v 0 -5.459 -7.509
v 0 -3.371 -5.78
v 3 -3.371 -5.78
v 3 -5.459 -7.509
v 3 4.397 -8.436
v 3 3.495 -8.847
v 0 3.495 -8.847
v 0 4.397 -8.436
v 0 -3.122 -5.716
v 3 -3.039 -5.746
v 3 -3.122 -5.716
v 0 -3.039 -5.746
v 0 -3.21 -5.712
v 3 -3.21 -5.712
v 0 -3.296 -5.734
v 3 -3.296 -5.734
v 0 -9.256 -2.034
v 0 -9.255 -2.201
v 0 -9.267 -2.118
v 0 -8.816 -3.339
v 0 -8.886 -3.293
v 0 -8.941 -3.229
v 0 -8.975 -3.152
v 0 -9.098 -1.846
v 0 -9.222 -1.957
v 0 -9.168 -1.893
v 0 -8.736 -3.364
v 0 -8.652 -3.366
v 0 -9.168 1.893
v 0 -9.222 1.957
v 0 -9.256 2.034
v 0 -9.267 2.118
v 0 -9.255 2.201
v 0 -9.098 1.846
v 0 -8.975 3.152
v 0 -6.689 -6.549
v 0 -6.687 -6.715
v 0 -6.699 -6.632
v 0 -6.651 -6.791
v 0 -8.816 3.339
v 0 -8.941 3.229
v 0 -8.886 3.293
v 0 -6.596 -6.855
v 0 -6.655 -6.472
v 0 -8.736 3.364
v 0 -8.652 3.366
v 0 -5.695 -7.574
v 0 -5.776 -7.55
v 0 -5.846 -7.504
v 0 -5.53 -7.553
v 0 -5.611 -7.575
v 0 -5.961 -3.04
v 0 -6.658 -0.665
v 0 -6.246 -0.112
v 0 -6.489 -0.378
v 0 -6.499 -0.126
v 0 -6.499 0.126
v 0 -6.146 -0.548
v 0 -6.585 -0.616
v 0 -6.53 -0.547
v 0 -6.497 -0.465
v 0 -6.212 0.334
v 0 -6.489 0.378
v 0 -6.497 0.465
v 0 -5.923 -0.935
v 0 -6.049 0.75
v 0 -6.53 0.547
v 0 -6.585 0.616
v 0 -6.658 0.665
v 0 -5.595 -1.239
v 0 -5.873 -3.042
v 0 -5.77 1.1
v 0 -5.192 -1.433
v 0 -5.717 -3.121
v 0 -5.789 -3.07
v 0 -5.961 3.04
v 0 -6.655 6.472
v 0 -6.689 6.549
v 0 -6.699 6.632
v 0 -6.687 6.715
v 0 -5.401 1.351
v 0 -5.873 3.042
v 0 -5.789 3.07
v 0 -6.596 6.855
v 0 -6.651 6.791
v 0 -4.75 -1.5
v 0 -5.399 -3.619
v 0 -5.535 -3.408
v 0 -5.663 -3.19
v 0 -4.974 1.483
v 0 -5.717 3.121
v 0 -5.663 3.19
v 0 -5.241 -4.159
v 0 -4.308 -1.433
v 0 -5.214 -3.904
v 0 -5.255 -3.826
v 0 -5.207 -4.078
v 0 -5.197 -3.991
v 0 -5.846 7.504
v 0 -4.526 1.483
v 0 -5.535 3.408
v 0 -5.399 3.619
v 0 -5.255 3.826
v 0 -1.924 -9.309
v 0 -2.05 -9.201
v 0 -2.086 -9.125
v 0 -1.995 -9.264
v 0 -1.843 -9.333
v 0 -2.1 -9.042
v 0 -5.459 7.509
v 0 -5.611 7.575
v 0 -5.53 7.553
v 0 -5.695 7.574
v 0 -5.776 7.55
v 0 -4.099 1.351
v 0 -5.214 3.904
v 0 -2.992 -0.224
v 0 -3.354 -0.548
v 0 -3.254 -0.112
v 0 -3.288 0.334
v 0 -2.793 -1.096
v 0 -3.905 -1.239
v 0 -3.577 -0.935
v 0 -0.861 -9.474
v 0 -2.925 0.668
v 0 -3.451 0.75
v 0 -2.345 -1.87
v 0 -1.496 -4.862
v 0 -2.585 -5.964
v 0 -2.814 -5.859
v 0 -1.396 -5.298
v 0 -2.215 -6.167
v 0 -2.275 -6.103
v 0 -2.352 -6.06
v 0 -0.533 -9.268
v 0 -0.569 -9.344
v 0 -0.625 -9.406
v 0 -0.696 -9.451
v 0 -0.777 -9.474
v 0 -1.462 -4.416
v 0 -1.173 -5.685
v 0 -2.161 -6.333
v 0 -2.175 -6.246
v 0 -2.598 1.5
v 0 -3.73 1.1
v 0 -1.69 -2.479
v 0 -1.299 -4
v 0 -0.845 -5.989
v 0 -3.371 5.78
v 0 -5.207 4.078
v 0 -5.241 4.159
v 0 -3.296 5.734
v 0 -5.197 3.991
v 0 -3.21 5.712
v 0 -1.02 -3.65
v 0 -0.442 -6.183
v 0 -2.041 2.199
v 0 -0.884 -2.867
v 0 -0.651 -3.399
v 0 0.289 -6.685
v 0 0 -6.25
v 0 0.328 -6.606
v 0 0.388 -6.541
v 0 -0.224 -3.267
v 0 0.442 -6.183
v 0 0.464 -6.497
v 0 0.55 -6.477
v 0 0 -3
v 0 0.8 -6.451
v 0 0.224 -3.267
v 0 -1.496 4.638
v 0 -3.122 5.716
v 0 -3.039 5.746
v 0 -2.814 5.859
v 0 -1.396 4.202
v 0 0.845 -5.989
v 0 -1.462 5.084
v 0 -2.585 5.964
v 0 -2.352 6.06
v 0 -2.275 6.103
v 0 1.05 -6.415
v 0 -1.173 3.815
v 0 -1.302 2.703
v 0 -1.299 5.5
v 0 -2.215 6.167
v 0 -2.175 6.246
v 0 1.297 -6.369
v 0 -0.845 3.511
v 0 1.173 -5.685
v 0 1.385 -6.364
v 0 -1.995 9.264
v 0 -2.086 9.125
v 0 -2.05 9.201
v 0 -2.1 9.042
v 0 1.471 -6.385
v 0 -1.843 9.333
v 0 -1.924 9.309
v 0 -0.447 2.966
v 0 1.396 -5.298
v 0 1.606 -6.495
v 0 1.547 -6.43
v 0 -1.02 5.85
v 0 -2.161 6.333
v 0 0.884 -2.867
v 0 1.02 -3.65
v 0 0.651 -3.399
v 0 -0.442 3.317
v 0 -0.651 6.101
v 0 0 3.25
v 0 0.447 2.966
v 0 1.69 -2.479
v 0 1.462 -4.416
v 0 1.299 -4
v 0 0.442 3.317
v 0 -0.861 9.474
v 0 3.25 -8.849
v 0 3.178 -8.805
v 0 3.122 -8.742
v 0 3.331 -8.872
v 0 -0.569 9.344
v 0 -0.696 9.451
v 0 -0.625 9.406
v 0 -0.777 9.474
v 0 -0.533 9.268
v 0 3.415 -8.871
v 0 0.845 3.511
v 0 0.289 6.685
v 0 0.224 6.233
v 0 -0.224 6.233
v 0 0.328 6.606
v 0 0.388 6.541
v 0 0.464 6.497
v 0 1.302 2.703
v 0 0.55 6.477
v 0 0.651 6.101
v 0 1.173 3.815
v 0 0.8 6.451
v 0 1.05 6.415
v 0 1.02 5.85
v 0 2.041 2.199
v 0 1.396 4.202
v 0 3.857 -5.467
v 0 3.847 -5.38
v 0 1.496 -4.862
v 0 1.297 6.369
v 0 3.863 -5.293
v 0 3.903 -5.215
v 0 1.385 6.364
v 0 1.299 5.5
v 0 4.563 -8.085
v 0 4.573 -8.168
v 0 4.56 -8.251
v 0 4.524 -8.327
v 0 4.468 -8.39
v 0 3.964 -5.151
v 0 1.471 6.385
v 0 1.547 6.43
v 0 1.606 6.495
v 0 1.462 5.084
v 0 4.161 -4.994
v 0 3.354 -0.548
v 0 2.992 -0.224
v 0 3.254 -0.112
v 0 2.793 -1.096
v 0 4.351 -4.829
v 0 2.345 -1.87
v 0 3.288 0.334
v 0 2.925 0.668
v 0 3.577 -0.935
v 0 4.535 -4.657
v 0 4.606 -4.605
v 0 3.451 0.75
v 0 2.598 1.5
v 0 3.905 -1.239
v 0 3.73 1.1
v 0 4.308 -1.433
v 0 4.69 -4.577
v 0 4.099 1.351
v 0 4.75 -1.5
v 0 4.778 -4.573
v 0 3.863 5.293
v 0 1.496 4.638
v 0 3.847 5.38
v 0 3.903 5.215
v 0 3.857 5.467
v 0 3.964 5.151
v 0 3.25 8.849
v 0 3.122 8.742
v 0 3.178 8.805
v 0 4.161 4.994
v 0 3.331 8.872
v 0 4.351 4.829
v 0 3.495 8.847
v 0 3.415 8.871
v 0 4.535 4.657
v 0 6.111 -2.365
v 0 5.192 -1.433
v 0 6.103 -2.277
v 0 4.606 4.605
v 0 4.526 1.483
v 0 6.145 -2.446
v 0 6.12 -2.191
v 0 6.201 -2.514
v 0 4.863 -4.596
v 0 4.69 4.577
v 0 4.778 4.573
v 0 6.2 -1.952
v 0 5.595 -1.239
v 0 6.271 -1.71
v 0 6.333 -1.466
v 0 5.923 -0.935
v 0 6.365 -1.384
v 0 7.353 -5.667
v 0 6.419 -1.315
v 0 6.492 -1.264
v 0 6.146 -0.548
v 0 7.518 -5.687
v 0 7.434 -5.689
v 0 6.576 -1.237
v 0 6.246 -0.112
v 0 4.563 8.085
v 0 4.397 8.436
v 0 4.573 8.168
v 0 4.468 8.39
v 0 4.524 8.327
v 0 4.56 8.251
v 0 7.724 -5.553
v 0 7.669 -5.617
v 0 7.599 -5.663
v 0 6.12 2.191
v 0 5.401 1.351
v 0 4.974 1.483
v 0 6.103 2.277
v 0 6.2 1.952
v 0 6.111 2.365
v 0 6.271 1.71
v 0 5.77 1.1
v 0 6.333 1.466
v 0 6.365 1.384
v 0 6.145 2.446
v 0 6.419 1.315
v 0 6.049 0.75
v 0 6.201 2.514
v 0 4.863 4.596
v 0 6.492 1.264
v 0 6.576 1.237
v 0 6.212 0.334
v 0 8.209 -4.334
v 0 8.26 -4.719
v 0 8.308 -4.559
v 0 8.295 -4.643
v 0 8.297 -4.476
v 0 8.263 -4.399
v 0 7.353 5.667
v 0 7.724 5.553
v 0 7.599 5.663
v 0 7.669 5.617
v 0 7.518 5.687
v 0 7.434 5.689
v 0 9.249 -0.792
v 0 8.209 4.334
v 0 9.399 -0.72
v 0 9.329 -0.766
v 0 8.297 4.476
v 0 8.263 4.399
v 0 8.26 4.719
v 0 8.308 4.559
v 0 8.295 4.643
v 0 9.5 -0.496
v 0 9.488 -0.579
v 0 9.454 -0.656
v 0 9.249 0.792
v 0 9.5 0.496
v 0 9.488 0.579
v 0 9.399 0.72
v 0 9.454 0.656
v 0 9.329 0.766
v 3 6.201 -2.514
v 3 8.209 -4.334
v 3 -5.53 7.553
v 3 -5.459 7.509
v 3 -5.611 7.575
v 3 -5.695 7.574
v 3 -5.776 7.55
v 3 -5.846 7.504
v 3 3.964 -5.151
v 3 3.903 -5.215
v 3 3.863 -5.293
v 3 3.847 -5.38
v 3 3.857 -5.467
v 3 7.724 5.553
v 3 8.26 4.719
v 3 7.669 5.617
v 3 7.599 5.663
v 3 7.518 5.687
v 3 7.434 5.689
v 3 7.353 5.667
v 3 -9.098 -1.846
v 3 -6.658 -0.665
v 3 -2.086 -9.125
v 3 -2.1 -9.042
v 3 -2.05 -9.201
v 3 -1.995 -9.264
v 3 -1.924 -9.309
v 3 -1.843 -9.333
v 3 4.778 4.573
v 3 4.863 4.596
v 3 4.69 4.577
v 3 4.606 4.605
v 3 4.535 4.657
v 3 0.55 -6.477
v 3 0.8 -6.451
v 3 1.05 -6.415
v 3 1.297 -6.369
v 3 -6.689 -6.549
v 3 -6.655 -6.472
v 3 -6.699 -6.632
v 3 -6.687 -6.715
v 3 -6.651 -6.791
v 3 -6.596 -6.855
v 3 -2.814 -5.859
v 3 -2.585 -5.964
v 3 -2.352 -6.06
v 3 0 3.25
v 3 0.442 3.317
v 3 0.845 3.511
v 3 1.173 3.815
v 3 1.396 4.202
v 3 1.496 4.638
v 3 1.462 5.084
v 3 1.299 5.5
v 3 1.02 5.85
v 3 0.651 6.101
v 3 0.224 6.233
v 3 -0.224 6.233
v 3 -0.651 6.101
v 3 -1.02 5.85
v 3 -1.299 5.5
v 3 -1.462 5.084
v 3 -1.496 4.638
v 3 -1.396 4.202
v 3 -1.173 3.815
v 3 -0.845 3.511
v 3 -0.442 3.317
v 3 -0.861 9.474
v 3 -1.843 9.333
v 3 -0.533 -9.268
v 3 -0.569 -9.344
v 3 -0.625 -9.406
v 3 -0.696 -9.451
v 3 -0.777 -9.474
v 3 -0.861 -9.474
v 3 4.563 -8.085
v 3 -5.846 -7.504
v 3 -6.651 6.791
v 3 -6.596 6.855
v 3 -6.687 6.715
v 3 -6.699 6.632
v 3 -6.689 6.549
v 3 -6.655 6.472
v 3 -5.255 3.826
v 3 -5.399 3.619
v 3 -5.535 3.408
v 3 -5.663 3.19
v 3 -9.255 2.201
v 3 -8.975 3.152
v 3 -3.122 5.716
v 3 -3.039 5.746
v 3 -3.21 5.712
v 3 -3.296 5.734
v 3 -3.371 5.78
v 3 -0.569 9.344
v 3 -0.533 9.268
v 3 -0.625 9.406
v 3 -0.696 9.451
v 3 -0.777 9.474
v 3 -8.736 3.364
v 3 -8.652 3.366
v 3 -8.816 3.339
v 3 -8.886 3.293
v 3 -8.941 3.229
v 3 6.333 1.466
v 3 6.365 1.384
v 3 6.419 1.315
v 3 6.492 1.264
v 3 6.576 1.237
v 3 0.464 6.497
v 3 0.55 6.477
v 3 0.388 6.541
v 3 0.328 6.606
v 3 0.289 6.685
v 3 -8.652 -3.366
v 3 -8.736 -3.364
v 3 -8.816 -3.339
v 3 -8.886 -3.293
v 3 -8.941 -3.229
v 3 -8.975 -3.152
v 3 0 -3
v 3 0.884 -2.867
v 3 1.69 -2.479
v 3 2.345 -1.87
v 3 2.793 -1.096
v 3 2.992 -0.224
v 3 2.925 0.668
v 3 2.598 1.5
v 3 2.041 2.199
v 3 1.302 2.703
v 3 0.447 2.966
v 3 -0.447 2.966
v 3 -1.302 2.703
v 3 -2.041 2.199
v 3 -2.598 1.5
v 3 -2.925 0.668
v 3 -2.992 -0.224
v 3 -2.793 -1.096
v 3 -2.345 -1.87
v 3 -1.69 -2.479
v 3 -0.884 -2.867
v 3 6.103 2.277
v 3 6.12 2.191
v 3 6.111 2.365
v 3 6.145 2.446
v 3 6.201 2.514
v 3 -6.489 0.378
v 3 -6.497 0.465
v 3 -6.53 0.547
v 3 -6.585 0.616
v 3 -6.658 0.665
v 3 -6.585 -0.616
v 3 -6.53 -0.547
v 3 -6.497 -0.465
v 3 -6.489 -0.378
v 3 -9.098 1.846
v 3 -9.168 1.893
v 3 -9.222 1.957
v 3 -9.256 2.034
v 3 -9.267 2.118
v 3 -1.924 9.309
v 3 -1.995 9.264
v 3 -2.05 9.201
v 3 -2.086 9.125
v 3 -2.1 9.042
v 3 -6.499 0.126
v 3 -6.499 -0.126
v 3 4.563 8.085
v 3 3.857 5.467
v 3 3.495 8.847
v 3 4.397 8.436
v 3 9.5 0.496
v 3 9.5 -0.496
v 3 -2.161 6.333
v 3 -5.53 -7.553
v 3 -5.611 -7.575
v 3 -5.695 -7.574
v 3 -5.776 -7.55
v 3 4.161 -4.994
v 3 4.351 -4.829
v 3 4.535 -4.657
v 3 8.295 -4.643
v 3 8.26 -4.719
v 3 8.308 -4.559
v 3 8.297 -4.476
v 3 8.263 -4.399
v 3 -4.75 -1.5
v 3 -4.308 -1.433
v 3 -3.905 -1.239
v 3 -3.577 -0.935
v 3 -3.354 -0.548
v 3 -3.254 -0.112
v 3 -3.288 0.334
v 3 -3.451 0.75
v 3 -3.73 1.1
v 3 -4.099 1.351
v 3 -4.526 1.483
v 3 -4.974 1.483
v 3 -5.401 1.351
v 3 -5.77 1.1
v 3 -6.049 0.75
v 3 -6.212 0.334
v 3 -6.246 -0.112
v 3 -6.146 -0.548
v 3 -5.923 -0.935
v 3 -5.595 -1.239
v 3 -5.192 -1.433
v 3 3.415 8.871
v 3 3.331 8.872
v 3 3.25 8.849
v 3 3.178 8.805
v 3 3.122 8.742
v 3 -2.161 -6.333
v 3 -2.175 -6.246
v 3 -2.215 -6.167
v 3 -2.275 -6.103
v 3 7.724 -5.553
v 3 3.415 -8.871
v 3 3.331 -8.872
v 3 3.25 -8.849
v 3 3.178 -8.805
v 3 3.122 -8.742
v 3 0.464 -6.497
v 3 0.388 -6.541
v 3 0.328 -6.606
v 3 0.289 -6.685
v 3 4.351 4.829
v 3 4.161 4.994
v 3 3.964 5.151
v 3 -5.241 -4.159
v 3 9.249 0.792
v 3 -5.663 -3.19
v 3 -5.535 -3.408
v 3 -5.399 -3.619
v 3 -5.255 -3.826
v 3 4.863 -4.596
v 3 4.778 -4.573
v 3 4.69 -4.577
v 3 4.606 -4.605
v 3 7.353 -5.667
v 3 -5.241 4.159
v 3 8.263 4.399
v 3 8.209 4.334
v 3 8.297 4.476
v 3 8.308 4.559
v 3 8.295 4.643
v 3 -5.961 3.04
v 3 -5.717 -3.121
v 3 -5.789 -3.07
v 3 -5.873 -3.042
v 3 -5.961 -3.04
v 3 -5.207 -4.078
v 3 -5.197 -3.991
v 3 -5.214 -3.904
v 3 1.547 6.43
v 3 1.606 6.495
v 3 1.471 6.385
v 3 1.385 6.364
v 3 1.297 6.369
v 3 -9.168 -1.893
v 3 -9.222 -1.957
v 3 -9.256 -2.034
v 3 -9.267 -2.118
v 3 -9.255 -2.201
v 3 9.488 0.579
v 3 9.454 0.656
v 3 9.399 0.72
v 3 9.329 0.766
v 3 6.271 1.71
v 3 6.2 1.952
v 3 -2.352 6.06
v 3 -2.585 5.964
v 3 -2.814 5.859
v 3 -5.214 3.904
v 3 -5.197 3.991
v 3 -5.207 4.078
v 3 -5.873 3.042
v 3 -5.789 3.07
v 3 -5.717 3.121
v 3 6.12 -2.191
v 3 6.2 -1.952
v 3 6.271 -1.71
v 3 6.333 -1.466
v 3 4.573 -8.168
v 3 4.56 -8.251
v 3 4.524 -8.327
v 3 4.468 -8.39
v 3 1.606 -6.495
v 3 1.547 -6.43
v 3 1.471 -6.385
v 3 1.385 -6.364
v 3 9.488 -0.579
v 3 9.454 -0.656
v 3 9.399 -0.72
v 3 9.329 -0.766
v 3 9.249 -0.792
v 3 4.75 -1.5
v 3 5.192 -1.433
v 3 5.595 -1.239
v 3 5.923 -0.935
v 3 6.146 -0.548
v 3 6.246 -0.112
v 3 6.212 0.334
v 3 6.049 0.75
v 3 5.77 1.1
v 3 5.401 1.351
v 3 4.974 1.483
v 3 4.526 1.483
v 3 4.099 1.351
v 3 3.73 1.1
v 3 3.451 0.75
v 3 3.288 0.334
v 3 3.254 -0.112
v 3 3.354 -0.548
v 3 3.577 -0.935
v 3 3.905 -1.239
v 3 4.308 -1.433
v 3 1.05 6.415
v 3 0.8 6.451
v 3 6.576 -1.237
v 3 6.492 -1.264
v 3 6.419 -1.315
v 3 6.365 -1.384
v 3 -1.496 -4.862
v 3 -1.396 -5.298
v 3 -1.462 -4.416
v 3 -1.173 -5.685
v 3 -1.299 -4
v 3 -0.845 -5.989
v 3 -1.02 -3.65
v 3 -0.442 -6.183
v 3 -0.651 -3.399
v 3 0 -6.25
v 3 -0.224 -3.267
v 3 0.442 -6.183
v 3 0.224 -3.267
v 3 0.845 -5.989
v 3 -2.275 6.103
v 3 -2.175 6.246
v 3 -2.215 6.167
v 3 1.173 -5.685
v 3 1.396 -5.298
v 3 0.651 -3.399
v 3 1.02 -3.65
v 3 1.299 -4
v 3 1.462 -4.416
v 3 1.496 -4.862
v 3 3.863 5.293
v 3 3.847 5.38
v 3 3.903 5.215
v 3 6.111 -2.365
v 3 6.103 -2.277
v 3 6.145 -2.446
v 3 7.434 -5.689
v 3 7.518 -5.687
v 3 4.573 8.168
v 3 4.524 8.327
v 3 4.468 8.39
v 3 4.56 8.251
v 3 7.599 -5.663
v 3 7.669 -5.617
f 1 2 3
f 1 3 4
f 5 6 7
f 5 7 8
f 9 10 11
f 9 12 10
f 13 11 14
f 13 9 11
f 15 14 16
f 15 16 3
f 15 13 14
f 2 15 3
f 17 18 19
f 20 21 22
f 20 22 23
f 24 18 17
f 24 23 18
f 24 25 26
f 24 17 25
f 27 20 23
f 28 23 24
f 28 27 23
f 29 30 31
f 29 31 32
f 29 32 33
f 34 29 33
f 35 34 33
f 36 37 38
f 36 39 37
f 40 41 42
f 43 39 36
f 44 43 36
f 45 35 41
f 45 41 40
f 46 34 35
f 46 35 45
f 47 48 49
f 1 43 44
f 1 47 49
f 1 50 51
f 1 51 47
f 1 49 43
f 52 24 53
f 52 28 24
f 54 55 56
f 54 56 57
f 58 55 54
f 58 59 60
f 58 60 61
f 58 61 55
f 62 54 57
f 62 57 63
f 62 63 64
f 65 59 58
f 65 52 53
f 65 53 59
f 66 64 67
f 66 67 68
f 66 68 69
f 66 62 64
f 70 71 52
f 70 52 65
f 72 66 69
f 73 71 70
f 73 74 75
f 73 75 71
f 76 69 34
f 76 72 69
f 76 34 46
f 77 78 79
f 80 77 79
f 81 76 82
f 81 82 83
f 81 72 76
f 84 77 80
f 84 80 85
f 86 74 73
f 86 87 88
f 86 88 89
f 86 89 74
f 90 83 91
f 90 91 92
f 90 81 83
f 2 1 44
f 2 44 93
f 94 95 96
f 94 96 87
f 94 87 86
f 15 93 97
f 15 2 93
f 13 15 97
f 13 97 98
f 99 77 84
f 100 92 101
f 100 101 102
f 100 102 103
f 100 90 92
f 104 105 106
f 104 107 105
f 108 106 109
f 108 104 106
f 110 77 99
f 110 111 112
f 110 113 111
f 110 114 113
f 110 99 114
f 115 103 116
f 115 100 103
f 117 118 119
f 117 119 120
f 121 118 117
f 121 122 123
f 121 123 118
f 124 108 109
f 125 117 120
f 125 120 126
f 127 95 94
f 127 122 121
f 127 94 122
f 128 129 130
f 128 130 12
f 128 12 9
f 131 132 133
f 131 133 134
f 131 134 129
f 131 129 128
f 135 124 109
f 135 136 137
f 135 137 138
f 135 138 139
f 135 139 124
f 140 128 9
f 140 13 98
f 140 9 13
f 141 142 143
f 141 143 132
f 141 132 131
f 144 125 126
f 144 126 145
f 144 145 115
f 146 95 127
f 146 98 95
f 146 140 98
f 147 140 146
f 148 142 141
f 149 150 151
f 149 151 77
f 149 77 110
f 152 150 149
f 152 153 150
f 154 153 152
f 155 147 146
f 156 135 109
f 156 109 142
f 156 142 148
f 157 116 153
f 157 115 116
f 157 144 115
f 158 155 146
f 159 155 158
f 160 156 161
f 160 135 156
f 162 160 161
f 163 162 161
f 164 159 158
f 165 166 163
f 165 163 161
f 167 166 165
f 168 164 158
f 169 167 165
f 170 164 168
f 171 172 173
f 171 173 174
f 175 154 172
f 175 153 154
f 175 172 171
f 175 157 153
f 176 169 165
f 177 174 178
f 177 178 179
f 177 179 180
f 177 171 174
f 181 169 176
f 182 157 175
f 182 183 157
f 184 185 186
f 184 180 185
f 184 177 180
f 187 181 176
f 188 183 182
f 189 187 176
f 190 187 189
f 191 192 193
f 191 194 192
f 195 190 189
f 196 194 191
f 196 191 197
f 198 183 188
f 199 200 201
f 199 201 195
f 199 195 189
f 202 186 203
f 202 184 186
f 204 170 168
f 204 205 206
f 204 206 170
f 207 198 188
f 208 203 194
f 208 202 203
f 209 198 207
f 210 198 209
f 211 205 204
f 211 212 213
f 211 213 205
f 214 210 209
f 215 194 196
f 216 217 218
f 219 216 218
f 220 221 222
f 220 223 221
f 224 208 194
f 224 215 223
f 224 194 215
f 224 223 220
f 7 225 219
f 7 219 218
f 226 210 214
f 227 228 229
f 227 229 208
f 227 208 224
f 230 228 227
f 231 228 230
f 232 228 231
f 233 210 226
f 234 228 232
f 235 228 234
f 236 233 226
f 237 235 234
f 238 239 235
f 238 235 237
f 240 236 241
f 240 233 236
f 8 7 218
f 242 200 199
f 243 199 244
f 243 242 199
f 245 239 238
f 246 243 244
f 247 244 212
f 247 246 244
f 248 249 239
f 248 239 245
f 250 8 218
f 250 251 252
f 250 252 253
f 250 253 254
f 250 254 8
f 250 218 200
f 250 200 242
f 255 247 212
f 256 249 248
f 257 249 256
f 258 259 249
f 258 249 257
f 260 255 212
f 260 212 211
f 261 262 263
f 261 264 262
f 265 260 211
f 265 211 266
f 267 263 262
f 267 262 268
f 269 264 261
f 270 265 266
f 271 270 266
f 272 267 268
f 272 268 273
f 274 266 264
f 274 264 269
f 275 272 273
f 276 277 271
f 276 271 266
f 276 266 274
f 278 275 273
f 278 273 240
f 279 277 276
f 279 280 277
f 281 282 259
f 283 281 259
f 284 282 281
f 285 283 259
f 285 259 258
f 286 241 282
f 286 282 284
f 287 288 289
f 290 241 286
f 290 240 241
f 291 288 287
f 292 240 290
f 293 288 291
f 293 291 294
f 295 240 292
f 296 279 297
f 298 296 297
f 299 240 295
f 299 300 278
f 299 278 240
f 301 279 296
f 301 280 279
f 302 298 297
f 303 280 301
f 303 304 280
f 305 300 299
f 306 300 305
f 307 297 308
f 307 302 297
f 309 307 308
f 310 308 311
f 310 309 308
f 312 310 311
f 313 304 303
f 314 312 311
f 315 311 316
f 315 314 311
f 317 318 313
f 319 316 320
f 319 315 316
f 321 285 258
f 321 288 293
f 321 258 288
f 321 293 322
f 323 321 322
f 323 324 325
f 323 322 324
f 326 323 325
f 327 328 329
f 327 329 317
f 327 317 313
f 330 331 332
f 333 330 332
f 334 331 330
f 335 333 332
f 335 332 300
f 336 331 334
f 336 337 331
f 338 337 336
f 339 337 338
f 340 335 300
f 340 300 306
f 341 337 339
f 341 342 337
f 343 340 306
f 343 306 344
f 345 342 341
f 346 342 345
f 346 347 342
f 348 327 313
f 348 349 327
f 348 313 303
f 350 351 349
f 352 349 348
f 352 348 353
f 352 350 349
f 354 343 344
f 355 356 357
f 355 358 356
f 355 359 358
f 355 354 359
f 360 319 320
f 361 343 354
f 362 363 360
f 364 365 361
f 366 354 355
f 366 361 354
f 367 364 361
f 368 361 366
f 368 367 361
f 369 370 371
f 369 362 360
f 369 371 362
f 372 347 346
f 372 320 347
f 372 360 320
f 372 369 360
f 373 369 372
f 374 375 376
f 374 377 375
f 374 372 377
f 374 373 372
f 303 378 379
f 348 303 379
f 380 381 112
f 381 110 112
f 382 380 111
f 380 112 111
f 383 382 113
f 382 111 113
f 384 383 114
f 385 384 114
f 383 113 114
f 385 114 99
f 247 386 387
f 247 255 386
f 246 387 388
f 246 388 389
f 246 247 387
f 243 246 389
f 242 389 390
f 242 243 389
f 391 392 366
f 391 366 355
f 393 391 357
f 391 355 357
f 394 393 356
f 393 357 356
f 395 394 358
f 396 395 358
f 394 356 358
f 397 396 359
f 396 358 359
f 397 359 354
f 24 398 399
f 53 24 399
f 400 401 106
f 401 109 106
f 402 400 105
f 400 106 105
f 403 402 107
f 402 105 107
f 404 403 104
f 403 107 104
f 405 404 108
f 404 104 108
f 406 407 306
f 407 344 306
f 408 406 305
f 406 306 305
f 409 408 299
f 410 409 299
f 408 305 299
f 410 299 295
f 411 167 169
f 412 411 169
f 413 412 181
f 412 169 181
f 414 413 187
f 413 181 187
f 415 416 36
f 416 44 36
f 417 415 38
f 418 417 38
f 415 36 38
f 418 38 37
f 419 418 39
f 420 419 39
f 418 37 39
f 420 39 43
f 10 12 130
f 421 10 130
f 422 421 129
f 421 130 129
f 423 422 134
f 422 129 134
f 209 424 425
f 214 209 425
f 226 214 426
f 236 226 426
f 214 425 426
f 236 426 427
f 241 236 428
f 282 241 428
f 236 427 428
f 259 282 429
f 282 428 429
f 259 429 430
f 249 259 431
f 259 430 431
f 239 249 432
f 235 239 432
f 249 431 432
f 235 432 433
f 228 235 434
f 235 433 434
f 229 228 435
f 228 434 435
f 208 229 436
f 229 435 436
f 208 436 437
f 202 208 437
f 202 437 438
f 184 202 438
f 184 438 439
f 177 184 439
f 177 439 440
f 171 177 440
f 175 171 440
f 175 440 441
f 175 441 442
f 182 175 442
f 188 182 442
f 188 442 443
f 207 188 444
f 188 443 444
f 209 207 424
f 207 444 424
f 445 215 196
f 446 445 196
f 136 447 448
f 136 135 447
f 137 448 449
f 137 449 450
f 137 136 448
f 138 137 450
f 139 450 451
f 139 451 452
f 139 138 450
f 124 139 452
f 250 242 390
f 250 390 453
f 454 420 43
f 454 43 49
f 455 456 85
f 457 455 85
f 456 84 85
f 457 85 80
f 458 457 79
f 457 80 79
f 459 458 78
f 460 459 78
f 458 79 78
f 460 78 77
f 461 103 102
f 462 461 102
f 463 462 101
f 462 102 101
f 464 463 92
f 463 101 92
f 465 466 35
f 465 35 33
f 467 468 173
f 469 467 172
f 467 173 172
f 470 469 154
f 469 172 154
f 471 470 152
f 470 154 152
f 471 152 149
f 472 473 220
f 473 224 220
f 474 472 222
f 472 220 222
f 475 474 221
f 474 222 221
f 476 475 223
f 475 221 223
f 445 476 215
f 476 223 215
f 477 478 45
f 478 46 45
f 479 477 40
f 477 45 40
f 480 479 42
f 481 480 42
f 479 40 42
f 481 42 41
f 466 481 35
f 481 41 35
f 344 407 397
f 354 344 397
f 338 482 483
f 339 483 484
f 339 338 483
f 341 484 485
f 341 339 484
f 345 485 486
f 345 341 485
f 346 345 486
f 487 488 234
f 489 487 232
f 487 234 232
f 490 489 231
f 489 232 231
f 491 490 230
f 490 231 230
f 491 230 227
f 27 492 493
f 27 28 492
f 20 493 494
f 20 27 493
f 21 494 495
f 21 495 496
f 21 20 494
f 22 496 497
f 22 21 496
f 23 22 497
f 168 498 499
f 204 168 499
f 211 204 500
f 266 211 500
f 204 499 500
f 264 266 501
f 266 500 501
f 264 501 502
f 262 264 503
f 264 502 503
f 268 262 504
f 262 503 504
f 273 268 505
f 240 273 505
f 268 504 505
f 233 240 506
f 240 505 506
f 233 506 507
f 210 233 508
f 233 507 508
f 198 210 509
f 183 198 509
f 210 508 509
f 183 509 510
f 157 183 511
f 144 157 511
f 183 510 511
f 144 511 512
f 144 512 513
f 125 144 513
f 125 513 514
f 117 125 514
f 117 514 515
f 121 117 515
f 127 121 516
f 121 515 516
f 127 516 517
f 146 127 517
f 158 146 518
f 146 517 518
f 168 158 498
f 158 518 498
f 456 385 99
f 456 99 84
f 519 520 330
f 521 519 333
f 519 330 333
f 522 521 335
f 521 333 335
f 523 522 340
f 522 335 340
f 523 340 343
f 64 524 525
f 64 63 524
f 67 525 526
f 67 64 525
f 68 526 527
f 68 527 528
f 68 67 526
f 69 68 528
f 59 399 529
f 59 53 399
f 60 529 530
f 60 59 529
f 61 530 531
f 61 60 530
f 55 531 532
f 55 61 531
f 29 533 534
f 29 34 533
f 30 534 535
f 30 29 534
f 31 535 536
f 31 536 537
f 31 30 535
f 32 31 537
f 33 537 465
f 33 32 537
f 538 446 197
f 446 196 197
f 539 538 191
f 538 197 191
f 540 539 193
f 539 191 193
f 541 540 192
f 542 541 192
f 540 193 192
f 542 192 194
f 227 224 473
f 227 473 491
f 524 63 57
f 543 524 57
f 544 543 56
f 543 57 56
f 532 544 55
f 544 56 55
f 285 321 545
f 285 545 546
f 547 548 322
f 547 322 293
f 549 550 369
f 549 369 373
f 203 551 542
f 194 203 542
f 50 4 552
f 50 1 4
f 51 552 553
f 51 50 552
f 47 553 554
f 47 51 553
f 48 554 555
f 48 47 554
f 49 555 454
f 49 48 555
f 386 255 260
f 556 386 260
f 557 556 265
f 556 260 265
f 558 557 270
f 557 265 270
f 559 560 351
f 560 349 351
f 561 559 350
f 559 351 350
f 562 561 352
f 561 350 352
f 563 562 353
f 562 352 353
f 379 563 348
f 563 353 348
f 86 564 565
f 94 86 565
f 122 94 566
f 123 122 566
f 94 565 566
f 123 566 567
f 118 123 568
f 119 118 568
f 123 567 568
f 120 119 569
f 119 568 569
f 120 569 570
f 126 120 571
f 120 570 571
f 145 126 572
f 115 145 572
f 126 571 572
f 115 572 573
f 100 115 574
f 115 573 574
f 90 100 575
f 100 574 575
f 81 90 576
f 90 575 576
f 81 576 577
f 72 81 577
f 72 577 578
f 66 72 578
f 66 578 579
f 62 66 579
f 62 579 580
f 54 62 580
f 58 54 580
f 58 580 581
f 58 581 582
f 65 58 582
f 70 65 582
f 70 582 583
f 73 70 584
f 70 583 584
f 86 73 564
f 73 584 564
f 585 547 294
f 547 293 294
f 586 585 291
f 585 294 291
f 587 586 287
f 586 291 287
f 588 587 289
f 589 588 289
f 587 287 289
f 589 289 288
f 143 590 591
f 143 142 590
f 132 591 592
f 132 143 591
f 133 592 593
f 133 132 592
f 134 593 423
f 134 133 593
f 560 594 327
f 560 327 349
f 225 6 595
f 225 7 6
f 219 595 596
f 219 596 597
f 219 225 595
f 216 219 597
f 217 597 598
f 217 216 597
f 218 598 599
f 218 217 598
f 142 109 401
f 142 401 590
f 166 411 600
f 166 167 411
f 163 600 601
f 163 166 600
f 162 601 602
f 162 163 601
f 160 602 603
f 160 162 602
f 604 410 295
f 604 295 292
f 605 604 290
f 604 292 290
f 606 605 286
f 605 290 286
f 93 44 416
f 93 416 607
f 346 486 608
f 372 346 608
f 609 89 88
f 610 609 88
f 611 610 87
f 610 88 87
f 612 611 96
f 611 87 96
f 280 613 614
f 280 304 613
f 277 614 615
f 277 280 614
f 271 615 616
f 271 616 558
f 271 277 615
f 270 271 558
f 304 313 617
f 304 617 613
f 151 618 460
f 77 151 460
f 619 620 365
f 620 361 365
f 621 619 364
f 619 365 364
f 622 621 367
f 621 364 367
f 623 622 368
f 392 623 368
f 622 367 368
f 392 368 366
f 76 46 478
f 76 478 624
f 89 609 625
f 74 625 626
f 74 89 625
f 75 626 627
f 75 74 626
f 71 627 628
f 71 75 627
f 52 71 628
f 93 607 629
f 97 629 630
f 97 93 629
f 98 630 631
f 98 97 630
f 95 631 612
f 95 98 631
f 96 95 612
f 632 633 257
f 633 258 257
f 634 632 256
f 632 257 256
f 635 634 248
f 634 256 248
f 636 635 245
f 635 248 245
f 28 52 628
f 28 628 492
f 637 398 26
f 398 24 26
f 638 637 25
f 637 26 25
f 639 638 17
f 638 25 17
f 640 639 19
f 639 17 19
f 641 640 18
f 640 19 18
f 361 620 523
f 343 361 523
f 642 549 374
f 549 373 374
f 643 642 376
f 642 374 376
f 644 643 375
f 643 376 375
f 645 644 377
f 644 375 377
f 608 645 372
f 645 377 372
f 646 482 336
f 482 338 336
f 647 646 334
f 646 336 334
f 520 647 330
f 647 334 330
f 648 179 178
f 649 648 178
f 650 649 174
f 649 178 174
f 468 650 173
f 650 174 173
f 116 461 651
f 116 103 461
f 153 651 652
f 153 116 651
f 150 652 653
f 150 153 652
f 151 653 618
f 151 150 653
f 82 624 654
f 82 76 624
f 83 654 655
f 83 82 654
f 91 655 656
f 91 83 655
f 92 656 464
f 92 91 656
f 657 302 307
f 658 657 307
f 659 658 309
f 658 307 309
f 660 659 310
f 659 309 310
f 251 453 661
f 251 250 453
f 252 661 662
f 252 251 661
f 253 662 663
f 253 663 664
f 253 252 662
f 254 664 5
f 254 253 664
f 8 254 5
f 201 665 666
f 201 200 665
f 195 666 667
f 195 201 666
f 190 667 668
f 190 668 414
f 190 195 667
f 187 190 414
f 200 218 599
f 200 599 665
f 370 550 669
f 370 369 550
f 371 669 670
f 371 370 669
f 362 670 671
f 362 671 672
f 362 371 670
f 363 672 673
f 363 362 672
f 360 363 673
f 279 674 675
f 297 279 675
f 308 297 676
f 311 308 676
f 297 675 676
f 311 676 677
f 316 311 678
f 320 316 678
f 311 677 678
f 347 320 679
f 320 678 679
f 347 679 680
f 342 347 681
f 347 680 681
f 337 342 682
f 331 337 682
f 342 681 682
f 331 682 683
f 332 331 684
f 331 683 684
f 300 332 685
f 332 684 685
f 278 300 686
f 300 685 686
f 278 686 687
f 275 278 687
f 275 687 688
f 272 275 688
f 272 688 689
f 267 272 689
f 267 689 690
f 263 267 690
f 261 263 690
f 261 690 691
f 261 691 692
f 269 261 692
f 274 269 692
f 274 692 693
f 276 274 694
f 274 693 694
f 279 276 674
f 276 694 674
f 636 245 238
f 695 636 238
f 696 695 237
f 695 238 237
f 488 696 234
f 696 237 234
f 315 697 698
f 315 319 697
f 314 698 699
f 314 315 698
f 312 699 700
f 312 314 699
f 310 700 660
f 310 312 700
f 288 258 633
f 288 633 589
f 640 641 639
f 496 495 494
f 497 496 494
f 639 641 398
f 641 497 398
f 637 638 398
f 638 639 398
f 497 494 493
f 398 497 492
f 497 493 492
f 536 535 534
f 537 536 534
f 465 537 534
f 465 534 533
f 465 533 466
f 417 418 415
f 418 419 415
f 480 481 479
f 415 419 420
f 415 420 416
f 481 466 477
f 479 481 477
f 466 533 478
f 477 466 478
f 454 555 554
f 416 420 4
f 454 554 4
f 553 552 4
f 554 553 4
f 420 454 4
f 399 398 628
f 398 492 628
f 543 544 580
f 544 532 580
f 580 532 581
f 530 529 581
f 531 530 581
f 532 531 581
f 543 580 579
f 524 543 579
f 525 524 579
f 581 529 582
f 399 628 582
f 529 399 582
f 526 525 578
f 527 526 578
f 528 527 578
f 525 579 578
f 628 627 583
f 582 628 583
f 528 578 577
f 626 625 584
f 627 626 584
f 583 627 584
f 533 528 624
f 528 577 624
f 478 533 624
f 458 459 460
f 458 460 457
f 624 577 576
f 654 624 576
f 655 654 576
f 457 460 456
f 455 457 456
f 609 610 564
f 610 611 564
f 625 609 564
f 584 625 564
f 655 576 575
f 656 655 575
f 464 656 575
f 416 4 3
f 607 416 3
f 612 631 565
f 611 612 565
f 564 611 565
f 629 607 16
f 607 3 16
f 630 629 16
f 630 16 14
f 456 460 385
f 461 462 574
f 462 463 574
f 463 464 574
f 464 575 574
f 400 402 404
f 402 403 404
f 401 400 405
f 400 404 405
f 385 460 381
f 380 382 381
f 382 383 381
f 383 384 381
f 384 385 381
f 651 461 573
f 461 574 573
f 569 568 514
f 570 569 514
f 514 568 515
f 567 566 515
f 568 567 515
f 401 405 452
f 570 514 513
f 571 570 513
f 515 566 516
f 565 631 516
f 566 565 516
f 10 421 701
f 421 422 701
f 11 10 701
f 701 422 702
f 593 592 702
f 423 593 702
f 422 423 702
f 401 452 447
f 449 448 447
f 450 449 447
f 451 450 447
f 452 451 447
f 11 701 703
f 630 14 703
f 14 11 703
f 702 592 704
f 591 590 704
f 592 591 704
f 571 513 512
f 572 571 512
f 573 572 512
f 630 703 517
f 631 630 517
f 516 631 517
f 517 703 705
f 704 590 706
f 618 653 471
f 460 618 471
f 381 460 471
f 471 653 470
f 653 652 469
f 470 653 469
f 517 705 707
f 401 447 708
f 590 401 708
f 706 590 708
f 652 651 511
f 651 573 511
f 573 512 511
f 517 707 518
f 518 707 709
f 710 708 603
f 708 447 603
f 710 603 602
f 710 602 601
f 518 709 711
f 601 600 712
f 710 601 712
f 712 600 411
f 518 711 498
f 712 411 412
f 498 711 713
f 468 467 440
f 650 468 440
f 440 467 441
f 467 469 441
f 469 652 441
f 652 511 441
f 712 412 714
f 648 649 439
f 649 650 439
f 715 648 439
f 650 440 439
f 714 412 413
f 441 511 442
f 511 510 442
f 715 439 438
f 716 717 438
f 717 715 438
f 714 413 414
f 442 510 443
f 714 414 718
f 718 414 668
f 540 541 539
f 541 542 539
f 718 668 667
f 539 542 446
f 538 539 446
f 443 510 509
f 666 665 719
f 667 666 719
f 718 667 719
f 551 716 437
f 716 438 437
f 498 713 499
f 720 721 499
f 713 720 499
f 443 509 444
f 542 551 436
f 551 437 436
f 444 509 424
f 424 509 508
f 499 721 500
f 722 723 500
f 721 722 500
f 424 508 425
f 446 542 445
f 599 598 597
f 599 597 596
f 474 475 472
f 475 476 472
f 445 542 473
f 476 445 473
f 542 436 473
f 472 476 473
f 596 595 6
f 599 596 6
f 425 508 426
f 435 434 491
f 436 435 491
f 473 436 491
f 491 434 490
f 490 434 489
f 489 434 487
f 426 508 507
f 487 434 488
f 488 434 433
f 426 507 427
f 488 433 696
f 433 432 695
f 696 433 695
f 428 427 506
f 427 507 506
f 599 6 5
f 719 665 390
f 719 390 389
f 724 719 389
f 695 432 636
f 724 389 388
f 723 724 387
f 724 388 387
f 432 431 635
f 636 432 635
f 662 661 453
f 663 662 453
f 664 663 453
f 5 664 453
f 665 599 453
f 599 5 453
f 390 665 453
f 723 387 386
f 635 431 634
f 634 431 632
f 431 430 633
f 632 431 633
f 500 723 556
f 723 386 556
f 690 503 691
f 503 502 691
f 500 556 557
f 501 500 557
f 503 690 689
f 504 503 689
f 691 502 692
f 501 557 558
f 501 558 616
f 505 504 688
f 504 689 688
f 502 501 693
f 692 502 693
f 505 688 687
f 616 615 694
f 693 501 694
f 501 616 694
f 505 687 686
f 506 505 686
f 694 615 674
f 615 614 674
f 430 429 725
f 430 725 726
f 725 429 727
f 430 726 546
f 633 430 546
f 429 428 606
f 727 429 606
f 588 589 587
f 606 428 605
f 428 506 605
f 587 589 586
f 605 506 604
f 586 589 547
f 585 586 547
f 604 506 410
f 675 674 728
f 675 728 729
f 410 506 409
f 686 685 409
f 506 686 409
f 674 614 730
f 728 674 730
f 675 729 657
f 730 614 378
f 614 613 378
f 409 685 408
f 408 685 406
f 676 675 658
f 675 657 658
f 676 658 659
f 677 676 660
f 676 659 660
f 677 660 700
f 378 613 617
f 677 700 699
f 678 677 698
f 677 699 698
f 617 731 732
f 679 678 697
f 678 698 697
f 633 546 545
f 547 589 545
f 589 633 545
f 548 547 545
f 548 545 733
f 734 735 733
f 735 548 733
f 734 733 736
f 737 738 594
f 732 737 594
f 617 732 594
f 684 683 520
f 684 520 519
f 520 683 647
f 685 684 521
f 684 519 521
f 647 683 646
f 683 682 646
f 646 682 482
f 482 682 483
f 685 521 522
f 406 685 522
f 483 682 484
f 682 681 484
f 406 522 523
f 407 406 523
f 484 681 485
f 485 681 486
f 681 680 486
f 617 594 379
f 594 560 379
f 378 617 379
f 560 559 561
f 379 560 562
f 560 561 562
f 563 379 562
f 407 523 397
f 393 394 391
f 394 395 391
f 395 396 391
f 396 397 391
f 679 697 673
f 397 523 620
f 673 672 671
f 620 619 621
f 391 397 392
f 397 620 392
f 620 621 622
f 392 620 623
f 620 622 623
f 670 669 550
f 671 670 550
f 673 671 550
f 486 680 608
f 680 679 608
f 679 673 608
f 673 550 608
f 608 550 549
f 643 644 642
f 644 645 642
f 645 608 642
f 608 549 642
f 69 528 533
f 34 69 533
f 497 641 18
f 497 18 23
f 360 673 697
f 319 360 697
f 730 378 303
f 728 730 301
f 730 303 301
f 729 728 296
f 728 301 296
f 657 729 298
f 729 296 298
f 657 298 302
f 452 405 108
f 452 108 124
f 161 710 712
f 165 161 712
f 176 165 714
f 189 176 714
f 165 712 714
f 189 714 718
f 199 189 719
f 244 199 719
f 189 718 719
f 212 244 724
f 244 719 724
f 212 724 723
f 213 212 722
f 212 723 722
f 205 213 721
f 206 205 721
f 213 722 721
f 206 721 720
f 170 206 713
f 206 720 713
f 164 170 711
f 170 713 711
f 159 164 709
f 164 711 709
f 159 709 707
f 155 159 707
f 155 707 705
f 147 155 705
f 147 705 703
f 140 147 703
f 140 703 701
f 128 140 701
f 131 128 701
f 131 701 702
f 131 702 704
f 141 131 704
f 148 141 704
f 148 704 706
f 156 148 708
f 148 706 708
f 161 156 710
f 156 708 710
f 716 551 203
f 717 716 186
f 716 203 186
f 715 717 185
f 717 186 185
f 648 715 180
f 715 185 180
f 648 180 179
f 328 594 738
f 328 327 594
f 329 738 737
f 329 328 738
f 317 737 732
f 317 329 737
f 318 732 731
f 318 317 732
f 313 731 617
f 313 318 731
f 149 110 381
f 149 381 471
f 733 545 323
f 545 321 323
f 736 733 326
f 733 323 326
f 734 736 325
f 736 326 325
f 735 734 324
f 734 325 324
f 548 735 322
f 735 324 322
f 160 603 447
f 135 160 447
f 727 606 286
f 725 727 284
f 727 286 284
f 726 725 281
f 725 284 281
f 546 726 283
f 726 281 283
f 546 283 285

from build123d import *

# Parameters (mm, degrees)
SKETCH9_R                 = 6.5
BOSS_EXTRUDE3_DEPTH       = 3
BOSS_EXTRUDE4_DEPTH       = 3
FILLET9_R                 = 0.3
FILLET10_R                = 0.3
FILLET11_R                = 0.3
FILLET12_R                = 0.3
CIRPATTERN6_COUNT         = 11
FILLET9_OF_CIRPATTERN6_R  = 0.3
FILLET10_OF_CIRPATTERN6_R = 0.3
FILLET11_OF_CIRPATTERN6_R = 0.3
FILLET12_OF_CIRPATTERN6_R = 0.3
SKETCH11_R                = 1.5
CUT_EXTRUDE1_DEPTH        = 3
SKETCH12_R                = 3
CUT_EXTRUDE2_DEPTH        = 3


with BuildPart() as part:
    # Sketch9 → Boss-Extrude3 (new body)
    with BuildSketch(Plane(origin=(0, 0, 0), x_dir=(0, 0, -1), z_dir=(1, 0, 0))):
        Circle(SKETCH9_R)
    extrude(amount=BOSS_EXTRUDE3_DEPTH)

    # Sketch10 → Boss-Extrude4 (add)
    with BuildSketch(Plane(origin=(3, 0, 0), x_dir=(0, 0, -1), z_dir=(1, 0, 0))):
        Polygon((0, 9.5), (0.75, 9.5), (1.5, 5), (0, 5), (-1.5, 5), (-0.75, 9.5), align=None)
    boss_extrude4 = extrude(amount=-BOSS_EXTRUDE4_DEPTH)

    # Fillet9
    fillet9_edges = [part.edges().sort_by_distance(p)[0] for p in [
        (1.5, 9.5, -0.75),
    ]]
    fillet(fillet9_edges, radius=FILLET9_R)

    # Fillet10
    fillet10_edges = [part.edges().sort_by_distance(p)[0] for p in [
        (1.5, 9.5, 0.75),
    ]]
    fillet(fillet10_edges, radius=FILLET10_R)

    # Fillet11
    fillet11_edges = [part.edges().sort_by_distance(p)[0] for p in [
        (1.5, 6.374542236, -1.270909627),
    ]]
    fillet(fillet11_edges, radius=FILLET11_R)

    # Fillet12
    fillet12_edges = [part.edges().sort_by_distance(p)[0] for p in [
        (1.5, 6.374542236, 1.270909627),
    ]]
    fillet(fillet12_edges, radius=FILLET12_R)

    # CirPattern6: Boss-Extrude4 ×11 about axis
    cirpattern6_axis = Axis((0, 0, 0), (1, 0, 0))
    for i in range(1, CIRPATTERN6_COUNT):
        add(boss_extrude4.rotate(cirpattern6_axis, i * 360 / CIRPATTERN6_COUNT))

    # Fillet9 of CirPattern6
    fillet9_of_cirpattern6_edges = [part.edges().sort_by_distance(p)[0] for p in [
        (1.5, 8.397389175, 4.505147616),
        (1.5, 4.62866662, 8.329942696),
        (1.5, -0.609624882, 9.510039827),
        (1.5, -5.654364792, 7.670766507),
        (1.5, -8.903883832, 3.39607902),
        (1.5, -9.326482667, -1.95683956),
        (1.5, -6.787989153, -6.688475406),
        (1.5, -2.094357045, -9.296567569),
        (1.5, 3.264218627, -8.953065216),
        (1.5, 7.586427949, -5.767027915),
    ]]
    fillet(fillet9_of_cirpattern6_edges, radius=FILLET9_OF_CIRPATTERN6_R)

    # Fillet10 of CirPattern6
    fillet10_of_cirpattern6_edges = [part.edges().sort_by_distance(p)[0] for p in [
        (1.5, 7.586427949, 5.767027915),
        (1.5, 3.264218627, 8.953065216),
        (1.5, -2.094357045, 9.296567569),
        (1.5, -6.787989153, 6.688475406),
        (1.5, -9.326482667, 1.95683956),
        (1.5, -8.903883832, -3.39607902),
        (1.5, -5.654364792, -7.670766507),
        (1.5, -0.609624882, -9.510039827),
        (1.5, 4.62866662, -8.329942696),
        (1.5, 8.397389175, -4.505147616),
    ]]
    fillet(fillet10_of_cirpattern6_edges, radius=FILLET10_OF_CIRPATTERN6_R)

    # Fillet11 of CirPattern6
    fillet11_of_cirpattern6_edges = [part.edges().sort_by_distance(p)[0] for p in [
        (1.5, 6.049711796, 2.377180512),
        (1.5, 3.804140606, 5.270532634),
        (1.5, 0.350781652, 6.490527885),
        (1.5, -3.213947997, 5.649826393),
        (1.5, -5.758271867, 3.01534494),
        (1.5, -6.474385104, -0.576487225),
        (1.5, -5.134926817, -3.98528877),
        (1.5, -2.165165547, -6.128789289),
        (1.5, 1.492020486, -6.326442513),
        (1.5, 4.675500556, -4.515494939),
    ]]
    fillet(fillet11_of_cirpattern6_edges, radius=FILLET11_OF_CIRPATTERN6_R)

    # Fillet12 of CirPattern6
    fillet12_of_cirpattern6_edges = [part.edges().sort_by_distance(p)[0] for p in [
        (1.5, 4.675500556, 4.515494939),
        (1.5, 1.492020486, 6.326442513),
        (1.5, -2.165165547, 6.128789289),
        (1.5, -5.134926817, 3.98528877),
        (1.5, -6.474385104, 0.576487225),
        (1.5, -5.758271867, -3.01534494),
        (1.5, -3.213947997, -5.649826393),
        (1.5, 0.350781652, -6.490527885),
        (1.5, 3.804140606, -5.270532634),
        (1.5, 6.049711796, -2.377180512),
    ]]
    fillet(fillet12_of_cirpattern6_edges, radius=FILLET12_OF_CIRPATTERN6_R)

    # Sketch11 → Cut-Extrude1 (cut)
    with BuildSketch(Plane(origin=(3, 0, 0), x_dir=(0, 0, -1), z_dir=(1, 0, 0))):
        with Locations((0, 4.75)):
            Circle(SKETCH11_R)
        with Locations((4.75, 0)):
            Circle(SKETCH11_R)
        with Locations((-4.75, 0)):
            Circle(SKETCH11_R)
        with Locations((0, -4.75)):
            Circle(SKETCH11_R)
    extrude(amount=-CUT_EXTRUDE1_DEPTH, mode=Mode.SUBTRACT)

    # Sketch12 → Cut-Extrude2 (cut)
    with BuildSketch(Plane(origin=(3, 0, 0), x_dir=(0, 0, -1), z_dir=(1, 0, 0))):
        Circle(SKETCH12_R)
    extrude(amount=-CUT_EXTRUDE2_DEPTH, mode=Mode.SUBTRACT)


solid = part.part
